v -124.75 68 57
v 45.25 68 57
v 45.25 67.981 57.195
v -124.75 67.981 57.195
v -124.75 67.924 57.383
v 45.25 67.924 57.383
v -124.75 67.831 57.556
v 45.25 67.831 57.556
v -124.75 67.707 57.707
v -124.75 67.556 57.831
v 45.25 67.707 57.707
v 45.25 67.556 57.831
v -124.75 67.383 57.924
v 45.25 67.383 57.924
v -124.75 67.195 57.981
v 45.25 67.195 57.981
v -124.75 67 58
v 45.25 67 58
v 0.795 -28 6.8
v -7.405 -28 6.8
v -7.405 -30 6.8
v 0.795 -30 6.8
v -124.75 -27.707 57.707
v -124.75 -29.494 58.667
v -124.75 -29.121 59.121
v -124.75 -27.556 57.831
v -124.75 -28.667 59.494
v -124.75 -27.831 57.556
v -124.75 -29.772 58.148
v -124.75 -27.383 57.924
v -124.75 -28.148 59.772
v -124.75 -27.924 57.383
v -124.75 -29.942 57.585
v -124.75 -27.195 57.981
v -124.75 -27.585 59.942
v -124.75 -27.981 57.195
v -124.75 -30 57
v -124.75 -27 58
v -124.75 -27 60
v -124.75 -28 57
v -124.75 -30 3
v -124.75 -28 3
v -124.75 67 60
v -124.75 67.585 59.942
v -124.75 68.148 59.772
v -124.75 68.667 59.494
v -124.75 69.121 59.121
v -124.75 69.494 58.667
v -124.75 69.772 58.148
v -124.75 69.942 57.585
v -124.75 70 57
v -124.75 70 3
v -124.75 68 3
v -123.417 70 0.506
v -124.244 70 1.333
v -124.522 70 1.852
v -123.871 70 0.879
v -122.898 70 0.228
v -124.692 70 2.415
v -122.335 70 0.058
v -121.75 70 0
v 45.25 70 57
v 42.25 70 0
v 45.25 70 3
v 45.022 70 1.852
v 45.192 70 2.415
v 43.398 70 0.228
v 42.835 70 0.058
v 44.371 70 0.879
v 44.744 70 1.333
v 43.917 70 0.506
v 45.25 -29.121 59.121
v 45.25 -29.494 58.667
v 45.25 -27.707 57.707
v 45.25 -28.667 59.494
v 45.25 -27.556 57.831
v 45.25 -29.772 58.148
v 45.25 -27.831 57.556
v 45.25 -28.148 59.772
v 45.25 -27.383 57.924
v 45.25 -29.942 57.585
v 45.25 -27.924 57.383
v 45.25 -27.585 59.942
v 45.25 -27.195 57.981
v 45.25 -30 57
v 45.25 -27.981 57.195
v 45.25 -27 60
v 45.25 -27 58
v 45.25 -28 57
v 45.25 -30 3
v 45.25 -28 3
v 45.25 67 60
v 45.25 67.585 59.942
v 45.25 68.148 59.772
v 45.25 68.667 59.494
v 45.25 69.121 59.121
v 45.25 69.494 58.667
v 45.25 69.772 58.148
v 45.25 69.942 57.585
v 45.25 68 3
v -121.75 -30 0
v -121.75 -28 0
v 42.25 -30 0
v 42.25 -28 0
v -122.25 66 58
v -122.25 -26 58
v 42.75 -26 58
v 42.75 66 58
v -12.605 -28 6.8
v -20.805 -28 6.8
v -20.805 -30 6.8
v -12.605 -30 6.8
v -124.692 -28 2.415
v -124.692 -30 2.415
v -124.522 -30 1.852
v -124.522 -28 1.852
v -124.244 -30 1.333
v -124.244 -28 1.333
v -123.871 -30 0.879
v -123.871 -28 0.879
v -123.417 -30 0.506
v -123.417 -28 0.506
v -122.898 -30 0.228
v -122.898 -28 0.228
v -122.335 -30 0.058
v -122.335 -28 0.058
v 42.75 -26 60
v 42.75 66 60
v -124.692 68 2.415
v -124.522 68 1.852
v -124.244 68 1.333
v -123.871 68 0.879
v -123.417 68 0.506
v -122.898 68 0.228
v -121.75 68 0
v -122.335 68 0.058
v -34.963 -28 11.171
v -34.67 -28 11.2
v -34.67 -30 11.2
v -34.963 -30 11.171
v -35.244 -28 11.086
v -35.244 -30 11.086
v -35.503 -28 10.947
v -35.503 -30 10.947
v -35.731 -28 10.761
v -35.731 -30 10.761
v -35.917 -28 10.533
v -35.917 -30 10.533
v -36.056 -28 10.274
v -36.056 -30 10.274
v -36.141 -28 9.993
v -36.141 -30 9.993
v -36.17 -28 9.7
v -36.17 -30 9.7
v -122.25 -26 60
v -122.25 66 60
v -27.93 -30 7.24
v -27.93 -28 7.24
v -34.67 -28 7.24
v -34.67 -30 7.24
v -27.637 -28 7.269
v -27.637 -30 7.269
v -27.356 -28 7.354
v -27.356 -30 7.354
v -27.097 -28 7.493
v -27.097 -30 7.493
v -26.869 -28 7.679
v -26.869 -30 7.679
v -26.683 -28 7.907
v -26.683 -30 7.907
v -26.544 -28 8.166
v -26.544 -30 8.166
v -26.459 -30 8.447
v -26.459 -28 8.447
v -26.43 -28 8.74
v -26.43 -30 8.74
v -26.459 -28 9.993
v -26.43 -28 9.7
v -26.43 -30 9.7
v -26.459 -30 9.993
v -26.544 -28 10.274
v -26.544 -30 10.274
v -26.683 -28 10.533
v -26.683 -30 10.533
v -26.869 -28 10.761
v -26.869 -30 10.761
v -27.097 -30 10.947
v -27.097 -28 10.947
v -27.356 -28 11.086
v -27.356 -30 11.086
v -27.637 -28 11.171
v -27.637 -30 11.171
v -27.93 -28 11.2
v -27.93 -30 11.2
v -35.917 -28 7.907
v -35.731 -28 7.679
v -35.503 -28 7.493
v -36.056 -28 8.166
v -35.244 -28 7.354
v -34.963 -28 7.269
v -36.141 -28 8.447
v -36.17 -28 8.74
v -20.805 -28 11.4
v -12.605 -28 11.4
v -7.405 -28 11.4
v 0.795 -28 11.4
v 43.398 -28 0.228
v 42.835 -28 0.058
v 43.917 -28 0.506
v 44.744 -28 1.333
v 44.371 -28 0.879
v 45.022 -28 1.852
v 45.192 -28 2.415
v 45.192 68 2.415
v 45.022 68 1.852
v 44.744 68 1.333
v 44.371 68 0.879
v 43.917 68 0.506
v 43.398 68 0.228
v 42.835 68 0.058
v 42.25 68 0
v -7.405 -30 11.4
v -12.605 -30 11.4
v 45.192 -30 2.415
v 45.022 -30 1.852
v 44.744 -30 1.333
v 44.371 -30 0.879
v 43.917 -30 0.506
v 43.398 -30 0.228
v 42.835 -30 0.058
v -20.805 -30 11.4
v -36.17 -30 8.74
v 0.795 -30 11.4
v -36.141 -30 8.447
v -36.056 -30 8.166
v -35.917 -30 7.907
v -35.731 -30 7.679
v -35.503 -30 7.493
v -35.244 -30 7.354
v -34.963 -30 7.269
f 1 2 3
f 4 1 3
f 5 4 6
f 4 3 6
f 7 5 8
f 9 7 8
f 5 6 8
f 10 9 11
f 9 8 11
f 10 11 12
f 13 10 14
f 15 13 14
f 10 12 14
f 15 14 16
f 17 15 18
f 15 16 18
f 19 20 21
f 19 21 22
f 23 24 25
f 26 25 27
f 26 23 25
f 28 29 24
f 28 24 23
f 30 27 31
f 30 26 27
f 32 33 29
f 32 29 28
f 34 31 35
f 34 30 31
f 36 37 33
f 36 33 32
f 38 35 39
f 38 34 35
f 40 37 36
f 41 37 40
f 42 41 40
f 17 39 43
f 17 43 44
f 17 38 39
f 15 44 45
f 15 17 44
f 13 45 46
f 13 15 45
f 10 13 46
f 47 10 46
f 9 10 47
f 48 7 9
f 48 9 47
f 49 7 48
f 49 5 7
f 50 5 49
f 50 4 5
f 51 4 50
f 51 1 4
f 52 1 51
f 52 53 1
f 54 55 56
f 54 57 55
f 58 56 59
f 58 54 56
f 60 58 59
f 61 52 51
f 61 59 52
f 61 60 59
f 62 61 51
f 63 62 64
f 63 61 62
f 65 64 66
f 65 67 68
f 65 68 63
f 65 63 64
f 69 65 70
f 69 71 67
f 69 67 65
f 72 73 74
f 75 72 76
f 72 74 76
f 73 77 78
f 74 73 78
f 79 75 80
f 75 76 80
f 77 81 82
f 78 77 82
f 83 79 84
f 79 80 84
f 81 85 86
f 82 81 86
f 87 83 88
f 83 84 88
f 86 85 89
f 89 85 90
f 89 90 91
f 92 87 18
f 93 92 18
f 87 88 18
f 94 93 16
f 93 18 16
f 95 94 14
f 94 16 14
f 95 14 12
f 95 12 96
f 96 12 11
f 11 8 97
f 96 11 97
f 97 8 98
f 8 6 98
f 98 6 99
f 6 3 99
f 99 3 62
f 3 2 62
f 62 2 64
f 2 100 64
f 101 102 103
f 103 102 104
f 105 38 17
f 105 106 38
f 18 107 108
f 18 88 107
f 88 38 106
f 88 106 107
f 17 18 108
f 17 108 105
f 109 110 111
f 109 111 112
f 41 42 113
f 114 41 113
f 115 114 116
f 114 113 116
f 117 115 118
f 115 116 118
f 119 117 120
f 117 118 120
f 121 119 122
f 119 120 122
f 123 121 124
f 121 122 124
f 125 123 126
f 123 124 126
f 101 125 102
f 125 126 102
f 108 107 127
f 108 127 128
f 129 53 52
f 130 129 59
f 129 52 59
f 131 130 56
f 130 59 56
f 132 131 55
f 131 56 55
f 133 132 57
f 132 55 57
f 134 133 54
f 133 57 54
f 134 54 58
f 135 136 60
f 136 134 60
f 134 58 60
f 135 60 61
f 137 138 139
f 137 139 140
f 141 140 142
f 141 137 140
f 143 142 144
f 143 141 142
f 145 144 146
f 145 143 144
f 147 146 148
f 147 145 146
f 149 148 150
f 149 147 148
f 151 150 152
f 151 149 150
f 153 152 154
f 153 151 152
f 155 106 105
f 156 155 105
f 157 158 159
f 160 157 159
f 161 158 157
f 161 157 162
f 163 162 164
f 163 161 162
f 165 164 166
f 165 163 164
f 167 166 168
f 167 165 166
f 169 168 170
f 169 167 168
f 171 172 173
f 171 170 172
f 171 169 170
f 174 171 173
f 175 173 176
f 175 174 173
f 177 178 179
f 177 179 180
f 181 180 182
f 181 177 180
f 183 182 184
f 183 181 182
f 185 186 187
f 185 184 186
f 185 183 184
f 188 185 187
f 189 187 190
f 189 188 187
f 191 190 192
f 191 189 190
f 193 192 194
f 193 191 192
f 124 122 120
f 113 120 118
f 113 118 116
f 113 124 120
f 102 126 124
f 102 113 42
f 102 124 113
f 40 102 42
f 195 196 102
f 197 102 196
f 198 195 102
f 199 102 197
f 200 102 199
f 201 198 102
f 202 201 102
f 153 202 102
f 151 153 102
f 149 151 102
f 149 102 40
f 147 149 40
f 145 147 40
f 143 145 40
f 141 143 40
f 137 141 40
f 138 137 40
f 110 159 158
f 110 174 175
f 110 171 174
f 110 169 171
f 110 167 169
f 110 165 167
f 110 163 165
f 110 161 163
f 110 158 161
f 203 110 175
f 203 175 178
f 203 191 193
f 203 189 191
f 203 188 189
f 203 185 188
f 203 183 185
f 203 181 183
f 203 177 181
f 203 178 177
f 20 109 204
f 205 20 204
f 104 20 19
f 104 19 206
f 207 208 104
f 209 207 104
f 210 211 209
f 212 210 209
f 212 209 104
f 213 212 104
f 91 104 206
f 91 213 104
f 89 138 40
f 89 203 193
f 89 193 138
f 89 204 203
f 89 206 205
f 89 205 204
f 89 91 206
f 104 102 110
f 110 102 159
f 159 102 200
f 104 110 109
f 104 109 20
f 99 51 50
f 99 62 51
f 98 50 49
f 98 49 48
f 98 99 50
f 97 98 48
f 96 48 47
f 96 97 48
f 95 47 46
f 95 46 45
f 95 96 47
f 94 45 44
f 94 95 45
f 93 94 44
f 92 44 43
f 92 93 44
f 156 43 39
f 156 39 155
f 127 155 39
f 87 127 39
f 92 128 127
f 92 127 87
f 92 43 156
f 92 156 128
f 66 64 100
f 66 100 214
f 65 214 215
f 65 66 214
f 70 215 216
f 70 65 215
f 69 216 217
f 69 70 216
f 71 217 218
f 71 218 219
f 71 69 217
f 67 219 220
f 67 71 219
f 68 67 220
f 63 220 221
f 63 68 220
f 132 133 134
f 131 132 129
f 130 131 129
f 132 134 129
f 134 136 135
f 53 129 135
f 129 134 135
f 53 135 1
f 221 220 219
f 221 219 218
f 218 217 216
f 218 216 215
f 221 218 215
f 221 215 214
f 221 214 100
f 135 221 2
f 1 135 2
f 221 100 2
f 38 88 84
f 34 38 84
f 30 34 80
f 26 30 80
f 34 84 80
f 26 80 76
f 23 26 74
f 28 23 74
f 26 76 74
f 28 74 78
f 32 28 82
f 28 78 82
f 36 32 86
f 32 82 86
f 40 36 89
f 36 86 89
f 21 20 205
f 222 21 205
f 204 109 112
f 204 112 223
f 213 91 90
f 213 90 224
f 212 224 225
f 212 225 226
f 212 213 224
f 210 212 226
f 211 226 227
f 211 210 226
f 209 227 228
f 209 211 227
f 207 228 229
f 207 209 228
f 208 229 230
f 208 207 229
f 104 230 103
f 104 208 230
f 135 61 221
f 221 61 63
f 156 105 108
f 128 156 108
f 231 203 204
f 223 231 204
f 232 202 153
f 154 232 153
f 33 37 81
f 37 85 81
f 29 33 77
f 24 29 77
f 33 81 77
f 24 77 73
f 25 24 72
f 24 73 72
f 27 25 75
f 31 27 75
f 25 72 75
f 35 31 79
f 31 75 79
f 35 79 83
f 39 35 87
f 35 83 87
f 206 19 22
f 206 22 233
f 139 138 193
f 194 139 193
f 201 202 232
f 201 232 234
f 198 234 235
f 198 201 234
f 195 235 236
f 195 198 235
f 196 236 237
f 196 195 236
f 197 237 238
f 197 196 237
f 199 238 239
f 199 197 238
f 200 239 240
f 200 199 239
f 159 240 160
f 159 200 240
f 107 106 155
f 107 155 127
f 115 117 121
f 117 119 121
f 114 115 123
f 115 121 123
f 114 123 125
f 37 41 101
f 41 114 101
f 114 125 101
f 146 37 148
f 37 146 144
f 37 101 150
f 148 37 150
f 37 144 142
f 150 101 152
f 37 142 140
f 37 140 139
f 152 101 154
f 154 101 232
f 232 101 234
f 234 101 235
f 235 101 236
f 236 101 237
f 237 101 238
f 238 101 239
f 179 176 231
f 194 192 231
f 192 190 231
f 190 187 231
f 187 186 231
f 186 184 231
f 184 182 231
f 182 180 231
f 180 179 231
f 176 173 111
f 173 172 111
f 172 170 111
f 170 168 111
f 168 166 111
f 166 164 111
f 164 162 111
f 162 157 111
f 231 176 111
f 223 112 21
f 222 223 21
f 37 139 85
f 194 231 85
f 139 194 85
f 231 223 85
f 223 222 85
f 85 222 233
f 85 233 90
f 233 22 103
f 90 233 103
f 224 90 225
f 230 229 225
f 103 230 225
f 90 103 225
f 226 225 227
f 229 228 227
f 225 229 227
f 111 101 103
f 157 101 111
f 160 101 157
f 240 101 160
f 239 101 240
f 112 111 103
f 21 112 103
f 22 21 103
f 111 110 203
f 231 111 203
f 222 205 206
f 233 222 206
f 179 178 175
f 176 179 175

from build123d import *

# Parameters (mm, degrees)
PAD001_DEPTH    = 250
SKETCH_W        = 170
SKETCH_H        = 100
PAD_DEPTH       = 60
FILLET_R        = 3
SKETCH001_W     = 17
SKETCH001_H     = 14.3
SKETCH001_W_2   = 15.6
SKETCH001_H_2   = 16.5
POCKET_DEPTH    = 45.251
SKETCH002_W     = 8.2
SKETCH002_H     = 4.6
POCKET001_DEPTH = 30.001
SKETCH006_W     = 165
SKETCH006_H     = 92
POCKET003_DEPTH = 500
SKETCH007_R     = 2.2
SKETCH007_R_2   = 1.75
POCKET004_DEPTH = 5


with BuildPart() as top_mask:
    # Sketch003 → Pad001 (new body, symmetric)
    with BuildSketch(Plane.YZ):
        with BuildLine():
            Line((-28, 0), (-28, 56.999991))
            ThreePointArc((-27, 58), (-27.70711, 57.707103), (-28, 56.999991))
            Line((-27, 58), (67, 58))
            ThreePointArc((68, 56.999991), (67.70711, 57.707103), (67, 58))
            Line((68, 0), (68, 56.999991))
            Line((-28, 0), (68, 0))
        make_face()
    extrude(amount=PAD001_DEPTH, both=True)


with BuildPart() as top:
    # Sketch → Pad (new body)
    with BuildSketch(Plane.XY):
        with Locations((-39.75, 20)):
            Rectangle(SKETCH_W, SKETCH_H)
    extrude(amount=PAD_DEPTH)

    # Fillet
    fillet_edges = [top.edges().sort_by_distance(p)[0] for p in [
        (45.25, 20, 0),
        (-39.75, -30, 60),
        (-39.75, 70, 60),
        (-124.75, 20, 0),
    ]]
    fillet(fillet_edges, radius=FILLET_R)

    # Sketch001 → Pocket (cut, through all)
    with BuildSketch(Plane.YZ):
        with Locations((-17.8, 14.75)):
            Rectangle(SKETCH001_W, SKETCH001_H)
        with Locations((1.05, 16.2)):
            Rectangle(SKETCH001_W_2, SKETCH001_H_2)
        with Locations((19, 16.2)):
            Rectangle(SKETCH001_W_2, SKETCH001_H_2)
    extrude(amount=POCKET_DEPTH, mode=Mode.SUBTRACT)

    # Sketch002 → Pocket001 (cut, through all)
    with BuildSketch(Plane.XZ):
        with BuildLine():
            ThreePointArc((-34.67, 11.2), (-35.73066, 10.76066), (-36.17, 9.7))
            Line((-36.17, 8.74), (-36.17, 9.7))
            ThreePointArc((-36.17, 8.74), (-35.73066, 7.67934), (-34.67, 7.24))
            Line((-27.93, 7.24), (-34.67, 7.24))
            ThreePointArc((-27.93, 7.24), (-26.86934, 7.67934), (-26.43, 8.74))
            Line((-26.43, 9.7), (-26.43, 8.74))
            ThreePointArc((-26.43, 9.7), (-26.86934, 10.76066), (-27.93, 11.2))
            Line((-34.67, 11.2), (-27.93, 11.2))
        make_face()
        with Locations((-16.704733, 9.1)):
            Rectangle(SKETCH002_W, SKETCH002_H)
        with Locations((-3.304733, 9.1)):
            Rectangle(SKETCH002_W, SKETCH002_H)
    extrude(amount=POCKET001_DEPTH, mode=Mode.SUBTRACT)

    # Sketch006 → Pocket003 (cut)
    with BuildSketch(Plane.XY.offset(30)):
        with Locations((-39.75, 20)):
            Rectangle(SKETCH006_W, SKETCH006_H)
    extrude(amount=POCKET003_DEPTH, mode=Mode.SUBTRACT)

    # Sketch007 → Pocket004 (cut)
    with BuildSketch(Plane.XY):
        with Locations((-39, 24.5)):
            Circle(SKETCH007_R)
        with Locations((19, 24.5)):
            Circle(SKETCH007_R)
        with Locations((-39, -24.5)):
            Circle(SKETCH007_R)
        with Locations((19, -24.5)):
            Circle(SKETCH007_R)
        with Locations((-112, 18.5)):
            Circle(SKETCH007_R)
        with Locations((-116.75, -23.9)):
            Circle(SKETCH007_R_2)
        with Locations((-116.75, 63.9)):
            Circle(SKETCH007_R_2)
        with Locations((37.25, 63.9)):
            Circle(SKETCH007_R_2)
    extrude(amount=POCKET004_DEPTH, mode=Mode.SUBTRACT)

    # Cut: cut Top Mask
    add(top_mask.part, mode=Mode.SUBTRACT)


solid = top.part
